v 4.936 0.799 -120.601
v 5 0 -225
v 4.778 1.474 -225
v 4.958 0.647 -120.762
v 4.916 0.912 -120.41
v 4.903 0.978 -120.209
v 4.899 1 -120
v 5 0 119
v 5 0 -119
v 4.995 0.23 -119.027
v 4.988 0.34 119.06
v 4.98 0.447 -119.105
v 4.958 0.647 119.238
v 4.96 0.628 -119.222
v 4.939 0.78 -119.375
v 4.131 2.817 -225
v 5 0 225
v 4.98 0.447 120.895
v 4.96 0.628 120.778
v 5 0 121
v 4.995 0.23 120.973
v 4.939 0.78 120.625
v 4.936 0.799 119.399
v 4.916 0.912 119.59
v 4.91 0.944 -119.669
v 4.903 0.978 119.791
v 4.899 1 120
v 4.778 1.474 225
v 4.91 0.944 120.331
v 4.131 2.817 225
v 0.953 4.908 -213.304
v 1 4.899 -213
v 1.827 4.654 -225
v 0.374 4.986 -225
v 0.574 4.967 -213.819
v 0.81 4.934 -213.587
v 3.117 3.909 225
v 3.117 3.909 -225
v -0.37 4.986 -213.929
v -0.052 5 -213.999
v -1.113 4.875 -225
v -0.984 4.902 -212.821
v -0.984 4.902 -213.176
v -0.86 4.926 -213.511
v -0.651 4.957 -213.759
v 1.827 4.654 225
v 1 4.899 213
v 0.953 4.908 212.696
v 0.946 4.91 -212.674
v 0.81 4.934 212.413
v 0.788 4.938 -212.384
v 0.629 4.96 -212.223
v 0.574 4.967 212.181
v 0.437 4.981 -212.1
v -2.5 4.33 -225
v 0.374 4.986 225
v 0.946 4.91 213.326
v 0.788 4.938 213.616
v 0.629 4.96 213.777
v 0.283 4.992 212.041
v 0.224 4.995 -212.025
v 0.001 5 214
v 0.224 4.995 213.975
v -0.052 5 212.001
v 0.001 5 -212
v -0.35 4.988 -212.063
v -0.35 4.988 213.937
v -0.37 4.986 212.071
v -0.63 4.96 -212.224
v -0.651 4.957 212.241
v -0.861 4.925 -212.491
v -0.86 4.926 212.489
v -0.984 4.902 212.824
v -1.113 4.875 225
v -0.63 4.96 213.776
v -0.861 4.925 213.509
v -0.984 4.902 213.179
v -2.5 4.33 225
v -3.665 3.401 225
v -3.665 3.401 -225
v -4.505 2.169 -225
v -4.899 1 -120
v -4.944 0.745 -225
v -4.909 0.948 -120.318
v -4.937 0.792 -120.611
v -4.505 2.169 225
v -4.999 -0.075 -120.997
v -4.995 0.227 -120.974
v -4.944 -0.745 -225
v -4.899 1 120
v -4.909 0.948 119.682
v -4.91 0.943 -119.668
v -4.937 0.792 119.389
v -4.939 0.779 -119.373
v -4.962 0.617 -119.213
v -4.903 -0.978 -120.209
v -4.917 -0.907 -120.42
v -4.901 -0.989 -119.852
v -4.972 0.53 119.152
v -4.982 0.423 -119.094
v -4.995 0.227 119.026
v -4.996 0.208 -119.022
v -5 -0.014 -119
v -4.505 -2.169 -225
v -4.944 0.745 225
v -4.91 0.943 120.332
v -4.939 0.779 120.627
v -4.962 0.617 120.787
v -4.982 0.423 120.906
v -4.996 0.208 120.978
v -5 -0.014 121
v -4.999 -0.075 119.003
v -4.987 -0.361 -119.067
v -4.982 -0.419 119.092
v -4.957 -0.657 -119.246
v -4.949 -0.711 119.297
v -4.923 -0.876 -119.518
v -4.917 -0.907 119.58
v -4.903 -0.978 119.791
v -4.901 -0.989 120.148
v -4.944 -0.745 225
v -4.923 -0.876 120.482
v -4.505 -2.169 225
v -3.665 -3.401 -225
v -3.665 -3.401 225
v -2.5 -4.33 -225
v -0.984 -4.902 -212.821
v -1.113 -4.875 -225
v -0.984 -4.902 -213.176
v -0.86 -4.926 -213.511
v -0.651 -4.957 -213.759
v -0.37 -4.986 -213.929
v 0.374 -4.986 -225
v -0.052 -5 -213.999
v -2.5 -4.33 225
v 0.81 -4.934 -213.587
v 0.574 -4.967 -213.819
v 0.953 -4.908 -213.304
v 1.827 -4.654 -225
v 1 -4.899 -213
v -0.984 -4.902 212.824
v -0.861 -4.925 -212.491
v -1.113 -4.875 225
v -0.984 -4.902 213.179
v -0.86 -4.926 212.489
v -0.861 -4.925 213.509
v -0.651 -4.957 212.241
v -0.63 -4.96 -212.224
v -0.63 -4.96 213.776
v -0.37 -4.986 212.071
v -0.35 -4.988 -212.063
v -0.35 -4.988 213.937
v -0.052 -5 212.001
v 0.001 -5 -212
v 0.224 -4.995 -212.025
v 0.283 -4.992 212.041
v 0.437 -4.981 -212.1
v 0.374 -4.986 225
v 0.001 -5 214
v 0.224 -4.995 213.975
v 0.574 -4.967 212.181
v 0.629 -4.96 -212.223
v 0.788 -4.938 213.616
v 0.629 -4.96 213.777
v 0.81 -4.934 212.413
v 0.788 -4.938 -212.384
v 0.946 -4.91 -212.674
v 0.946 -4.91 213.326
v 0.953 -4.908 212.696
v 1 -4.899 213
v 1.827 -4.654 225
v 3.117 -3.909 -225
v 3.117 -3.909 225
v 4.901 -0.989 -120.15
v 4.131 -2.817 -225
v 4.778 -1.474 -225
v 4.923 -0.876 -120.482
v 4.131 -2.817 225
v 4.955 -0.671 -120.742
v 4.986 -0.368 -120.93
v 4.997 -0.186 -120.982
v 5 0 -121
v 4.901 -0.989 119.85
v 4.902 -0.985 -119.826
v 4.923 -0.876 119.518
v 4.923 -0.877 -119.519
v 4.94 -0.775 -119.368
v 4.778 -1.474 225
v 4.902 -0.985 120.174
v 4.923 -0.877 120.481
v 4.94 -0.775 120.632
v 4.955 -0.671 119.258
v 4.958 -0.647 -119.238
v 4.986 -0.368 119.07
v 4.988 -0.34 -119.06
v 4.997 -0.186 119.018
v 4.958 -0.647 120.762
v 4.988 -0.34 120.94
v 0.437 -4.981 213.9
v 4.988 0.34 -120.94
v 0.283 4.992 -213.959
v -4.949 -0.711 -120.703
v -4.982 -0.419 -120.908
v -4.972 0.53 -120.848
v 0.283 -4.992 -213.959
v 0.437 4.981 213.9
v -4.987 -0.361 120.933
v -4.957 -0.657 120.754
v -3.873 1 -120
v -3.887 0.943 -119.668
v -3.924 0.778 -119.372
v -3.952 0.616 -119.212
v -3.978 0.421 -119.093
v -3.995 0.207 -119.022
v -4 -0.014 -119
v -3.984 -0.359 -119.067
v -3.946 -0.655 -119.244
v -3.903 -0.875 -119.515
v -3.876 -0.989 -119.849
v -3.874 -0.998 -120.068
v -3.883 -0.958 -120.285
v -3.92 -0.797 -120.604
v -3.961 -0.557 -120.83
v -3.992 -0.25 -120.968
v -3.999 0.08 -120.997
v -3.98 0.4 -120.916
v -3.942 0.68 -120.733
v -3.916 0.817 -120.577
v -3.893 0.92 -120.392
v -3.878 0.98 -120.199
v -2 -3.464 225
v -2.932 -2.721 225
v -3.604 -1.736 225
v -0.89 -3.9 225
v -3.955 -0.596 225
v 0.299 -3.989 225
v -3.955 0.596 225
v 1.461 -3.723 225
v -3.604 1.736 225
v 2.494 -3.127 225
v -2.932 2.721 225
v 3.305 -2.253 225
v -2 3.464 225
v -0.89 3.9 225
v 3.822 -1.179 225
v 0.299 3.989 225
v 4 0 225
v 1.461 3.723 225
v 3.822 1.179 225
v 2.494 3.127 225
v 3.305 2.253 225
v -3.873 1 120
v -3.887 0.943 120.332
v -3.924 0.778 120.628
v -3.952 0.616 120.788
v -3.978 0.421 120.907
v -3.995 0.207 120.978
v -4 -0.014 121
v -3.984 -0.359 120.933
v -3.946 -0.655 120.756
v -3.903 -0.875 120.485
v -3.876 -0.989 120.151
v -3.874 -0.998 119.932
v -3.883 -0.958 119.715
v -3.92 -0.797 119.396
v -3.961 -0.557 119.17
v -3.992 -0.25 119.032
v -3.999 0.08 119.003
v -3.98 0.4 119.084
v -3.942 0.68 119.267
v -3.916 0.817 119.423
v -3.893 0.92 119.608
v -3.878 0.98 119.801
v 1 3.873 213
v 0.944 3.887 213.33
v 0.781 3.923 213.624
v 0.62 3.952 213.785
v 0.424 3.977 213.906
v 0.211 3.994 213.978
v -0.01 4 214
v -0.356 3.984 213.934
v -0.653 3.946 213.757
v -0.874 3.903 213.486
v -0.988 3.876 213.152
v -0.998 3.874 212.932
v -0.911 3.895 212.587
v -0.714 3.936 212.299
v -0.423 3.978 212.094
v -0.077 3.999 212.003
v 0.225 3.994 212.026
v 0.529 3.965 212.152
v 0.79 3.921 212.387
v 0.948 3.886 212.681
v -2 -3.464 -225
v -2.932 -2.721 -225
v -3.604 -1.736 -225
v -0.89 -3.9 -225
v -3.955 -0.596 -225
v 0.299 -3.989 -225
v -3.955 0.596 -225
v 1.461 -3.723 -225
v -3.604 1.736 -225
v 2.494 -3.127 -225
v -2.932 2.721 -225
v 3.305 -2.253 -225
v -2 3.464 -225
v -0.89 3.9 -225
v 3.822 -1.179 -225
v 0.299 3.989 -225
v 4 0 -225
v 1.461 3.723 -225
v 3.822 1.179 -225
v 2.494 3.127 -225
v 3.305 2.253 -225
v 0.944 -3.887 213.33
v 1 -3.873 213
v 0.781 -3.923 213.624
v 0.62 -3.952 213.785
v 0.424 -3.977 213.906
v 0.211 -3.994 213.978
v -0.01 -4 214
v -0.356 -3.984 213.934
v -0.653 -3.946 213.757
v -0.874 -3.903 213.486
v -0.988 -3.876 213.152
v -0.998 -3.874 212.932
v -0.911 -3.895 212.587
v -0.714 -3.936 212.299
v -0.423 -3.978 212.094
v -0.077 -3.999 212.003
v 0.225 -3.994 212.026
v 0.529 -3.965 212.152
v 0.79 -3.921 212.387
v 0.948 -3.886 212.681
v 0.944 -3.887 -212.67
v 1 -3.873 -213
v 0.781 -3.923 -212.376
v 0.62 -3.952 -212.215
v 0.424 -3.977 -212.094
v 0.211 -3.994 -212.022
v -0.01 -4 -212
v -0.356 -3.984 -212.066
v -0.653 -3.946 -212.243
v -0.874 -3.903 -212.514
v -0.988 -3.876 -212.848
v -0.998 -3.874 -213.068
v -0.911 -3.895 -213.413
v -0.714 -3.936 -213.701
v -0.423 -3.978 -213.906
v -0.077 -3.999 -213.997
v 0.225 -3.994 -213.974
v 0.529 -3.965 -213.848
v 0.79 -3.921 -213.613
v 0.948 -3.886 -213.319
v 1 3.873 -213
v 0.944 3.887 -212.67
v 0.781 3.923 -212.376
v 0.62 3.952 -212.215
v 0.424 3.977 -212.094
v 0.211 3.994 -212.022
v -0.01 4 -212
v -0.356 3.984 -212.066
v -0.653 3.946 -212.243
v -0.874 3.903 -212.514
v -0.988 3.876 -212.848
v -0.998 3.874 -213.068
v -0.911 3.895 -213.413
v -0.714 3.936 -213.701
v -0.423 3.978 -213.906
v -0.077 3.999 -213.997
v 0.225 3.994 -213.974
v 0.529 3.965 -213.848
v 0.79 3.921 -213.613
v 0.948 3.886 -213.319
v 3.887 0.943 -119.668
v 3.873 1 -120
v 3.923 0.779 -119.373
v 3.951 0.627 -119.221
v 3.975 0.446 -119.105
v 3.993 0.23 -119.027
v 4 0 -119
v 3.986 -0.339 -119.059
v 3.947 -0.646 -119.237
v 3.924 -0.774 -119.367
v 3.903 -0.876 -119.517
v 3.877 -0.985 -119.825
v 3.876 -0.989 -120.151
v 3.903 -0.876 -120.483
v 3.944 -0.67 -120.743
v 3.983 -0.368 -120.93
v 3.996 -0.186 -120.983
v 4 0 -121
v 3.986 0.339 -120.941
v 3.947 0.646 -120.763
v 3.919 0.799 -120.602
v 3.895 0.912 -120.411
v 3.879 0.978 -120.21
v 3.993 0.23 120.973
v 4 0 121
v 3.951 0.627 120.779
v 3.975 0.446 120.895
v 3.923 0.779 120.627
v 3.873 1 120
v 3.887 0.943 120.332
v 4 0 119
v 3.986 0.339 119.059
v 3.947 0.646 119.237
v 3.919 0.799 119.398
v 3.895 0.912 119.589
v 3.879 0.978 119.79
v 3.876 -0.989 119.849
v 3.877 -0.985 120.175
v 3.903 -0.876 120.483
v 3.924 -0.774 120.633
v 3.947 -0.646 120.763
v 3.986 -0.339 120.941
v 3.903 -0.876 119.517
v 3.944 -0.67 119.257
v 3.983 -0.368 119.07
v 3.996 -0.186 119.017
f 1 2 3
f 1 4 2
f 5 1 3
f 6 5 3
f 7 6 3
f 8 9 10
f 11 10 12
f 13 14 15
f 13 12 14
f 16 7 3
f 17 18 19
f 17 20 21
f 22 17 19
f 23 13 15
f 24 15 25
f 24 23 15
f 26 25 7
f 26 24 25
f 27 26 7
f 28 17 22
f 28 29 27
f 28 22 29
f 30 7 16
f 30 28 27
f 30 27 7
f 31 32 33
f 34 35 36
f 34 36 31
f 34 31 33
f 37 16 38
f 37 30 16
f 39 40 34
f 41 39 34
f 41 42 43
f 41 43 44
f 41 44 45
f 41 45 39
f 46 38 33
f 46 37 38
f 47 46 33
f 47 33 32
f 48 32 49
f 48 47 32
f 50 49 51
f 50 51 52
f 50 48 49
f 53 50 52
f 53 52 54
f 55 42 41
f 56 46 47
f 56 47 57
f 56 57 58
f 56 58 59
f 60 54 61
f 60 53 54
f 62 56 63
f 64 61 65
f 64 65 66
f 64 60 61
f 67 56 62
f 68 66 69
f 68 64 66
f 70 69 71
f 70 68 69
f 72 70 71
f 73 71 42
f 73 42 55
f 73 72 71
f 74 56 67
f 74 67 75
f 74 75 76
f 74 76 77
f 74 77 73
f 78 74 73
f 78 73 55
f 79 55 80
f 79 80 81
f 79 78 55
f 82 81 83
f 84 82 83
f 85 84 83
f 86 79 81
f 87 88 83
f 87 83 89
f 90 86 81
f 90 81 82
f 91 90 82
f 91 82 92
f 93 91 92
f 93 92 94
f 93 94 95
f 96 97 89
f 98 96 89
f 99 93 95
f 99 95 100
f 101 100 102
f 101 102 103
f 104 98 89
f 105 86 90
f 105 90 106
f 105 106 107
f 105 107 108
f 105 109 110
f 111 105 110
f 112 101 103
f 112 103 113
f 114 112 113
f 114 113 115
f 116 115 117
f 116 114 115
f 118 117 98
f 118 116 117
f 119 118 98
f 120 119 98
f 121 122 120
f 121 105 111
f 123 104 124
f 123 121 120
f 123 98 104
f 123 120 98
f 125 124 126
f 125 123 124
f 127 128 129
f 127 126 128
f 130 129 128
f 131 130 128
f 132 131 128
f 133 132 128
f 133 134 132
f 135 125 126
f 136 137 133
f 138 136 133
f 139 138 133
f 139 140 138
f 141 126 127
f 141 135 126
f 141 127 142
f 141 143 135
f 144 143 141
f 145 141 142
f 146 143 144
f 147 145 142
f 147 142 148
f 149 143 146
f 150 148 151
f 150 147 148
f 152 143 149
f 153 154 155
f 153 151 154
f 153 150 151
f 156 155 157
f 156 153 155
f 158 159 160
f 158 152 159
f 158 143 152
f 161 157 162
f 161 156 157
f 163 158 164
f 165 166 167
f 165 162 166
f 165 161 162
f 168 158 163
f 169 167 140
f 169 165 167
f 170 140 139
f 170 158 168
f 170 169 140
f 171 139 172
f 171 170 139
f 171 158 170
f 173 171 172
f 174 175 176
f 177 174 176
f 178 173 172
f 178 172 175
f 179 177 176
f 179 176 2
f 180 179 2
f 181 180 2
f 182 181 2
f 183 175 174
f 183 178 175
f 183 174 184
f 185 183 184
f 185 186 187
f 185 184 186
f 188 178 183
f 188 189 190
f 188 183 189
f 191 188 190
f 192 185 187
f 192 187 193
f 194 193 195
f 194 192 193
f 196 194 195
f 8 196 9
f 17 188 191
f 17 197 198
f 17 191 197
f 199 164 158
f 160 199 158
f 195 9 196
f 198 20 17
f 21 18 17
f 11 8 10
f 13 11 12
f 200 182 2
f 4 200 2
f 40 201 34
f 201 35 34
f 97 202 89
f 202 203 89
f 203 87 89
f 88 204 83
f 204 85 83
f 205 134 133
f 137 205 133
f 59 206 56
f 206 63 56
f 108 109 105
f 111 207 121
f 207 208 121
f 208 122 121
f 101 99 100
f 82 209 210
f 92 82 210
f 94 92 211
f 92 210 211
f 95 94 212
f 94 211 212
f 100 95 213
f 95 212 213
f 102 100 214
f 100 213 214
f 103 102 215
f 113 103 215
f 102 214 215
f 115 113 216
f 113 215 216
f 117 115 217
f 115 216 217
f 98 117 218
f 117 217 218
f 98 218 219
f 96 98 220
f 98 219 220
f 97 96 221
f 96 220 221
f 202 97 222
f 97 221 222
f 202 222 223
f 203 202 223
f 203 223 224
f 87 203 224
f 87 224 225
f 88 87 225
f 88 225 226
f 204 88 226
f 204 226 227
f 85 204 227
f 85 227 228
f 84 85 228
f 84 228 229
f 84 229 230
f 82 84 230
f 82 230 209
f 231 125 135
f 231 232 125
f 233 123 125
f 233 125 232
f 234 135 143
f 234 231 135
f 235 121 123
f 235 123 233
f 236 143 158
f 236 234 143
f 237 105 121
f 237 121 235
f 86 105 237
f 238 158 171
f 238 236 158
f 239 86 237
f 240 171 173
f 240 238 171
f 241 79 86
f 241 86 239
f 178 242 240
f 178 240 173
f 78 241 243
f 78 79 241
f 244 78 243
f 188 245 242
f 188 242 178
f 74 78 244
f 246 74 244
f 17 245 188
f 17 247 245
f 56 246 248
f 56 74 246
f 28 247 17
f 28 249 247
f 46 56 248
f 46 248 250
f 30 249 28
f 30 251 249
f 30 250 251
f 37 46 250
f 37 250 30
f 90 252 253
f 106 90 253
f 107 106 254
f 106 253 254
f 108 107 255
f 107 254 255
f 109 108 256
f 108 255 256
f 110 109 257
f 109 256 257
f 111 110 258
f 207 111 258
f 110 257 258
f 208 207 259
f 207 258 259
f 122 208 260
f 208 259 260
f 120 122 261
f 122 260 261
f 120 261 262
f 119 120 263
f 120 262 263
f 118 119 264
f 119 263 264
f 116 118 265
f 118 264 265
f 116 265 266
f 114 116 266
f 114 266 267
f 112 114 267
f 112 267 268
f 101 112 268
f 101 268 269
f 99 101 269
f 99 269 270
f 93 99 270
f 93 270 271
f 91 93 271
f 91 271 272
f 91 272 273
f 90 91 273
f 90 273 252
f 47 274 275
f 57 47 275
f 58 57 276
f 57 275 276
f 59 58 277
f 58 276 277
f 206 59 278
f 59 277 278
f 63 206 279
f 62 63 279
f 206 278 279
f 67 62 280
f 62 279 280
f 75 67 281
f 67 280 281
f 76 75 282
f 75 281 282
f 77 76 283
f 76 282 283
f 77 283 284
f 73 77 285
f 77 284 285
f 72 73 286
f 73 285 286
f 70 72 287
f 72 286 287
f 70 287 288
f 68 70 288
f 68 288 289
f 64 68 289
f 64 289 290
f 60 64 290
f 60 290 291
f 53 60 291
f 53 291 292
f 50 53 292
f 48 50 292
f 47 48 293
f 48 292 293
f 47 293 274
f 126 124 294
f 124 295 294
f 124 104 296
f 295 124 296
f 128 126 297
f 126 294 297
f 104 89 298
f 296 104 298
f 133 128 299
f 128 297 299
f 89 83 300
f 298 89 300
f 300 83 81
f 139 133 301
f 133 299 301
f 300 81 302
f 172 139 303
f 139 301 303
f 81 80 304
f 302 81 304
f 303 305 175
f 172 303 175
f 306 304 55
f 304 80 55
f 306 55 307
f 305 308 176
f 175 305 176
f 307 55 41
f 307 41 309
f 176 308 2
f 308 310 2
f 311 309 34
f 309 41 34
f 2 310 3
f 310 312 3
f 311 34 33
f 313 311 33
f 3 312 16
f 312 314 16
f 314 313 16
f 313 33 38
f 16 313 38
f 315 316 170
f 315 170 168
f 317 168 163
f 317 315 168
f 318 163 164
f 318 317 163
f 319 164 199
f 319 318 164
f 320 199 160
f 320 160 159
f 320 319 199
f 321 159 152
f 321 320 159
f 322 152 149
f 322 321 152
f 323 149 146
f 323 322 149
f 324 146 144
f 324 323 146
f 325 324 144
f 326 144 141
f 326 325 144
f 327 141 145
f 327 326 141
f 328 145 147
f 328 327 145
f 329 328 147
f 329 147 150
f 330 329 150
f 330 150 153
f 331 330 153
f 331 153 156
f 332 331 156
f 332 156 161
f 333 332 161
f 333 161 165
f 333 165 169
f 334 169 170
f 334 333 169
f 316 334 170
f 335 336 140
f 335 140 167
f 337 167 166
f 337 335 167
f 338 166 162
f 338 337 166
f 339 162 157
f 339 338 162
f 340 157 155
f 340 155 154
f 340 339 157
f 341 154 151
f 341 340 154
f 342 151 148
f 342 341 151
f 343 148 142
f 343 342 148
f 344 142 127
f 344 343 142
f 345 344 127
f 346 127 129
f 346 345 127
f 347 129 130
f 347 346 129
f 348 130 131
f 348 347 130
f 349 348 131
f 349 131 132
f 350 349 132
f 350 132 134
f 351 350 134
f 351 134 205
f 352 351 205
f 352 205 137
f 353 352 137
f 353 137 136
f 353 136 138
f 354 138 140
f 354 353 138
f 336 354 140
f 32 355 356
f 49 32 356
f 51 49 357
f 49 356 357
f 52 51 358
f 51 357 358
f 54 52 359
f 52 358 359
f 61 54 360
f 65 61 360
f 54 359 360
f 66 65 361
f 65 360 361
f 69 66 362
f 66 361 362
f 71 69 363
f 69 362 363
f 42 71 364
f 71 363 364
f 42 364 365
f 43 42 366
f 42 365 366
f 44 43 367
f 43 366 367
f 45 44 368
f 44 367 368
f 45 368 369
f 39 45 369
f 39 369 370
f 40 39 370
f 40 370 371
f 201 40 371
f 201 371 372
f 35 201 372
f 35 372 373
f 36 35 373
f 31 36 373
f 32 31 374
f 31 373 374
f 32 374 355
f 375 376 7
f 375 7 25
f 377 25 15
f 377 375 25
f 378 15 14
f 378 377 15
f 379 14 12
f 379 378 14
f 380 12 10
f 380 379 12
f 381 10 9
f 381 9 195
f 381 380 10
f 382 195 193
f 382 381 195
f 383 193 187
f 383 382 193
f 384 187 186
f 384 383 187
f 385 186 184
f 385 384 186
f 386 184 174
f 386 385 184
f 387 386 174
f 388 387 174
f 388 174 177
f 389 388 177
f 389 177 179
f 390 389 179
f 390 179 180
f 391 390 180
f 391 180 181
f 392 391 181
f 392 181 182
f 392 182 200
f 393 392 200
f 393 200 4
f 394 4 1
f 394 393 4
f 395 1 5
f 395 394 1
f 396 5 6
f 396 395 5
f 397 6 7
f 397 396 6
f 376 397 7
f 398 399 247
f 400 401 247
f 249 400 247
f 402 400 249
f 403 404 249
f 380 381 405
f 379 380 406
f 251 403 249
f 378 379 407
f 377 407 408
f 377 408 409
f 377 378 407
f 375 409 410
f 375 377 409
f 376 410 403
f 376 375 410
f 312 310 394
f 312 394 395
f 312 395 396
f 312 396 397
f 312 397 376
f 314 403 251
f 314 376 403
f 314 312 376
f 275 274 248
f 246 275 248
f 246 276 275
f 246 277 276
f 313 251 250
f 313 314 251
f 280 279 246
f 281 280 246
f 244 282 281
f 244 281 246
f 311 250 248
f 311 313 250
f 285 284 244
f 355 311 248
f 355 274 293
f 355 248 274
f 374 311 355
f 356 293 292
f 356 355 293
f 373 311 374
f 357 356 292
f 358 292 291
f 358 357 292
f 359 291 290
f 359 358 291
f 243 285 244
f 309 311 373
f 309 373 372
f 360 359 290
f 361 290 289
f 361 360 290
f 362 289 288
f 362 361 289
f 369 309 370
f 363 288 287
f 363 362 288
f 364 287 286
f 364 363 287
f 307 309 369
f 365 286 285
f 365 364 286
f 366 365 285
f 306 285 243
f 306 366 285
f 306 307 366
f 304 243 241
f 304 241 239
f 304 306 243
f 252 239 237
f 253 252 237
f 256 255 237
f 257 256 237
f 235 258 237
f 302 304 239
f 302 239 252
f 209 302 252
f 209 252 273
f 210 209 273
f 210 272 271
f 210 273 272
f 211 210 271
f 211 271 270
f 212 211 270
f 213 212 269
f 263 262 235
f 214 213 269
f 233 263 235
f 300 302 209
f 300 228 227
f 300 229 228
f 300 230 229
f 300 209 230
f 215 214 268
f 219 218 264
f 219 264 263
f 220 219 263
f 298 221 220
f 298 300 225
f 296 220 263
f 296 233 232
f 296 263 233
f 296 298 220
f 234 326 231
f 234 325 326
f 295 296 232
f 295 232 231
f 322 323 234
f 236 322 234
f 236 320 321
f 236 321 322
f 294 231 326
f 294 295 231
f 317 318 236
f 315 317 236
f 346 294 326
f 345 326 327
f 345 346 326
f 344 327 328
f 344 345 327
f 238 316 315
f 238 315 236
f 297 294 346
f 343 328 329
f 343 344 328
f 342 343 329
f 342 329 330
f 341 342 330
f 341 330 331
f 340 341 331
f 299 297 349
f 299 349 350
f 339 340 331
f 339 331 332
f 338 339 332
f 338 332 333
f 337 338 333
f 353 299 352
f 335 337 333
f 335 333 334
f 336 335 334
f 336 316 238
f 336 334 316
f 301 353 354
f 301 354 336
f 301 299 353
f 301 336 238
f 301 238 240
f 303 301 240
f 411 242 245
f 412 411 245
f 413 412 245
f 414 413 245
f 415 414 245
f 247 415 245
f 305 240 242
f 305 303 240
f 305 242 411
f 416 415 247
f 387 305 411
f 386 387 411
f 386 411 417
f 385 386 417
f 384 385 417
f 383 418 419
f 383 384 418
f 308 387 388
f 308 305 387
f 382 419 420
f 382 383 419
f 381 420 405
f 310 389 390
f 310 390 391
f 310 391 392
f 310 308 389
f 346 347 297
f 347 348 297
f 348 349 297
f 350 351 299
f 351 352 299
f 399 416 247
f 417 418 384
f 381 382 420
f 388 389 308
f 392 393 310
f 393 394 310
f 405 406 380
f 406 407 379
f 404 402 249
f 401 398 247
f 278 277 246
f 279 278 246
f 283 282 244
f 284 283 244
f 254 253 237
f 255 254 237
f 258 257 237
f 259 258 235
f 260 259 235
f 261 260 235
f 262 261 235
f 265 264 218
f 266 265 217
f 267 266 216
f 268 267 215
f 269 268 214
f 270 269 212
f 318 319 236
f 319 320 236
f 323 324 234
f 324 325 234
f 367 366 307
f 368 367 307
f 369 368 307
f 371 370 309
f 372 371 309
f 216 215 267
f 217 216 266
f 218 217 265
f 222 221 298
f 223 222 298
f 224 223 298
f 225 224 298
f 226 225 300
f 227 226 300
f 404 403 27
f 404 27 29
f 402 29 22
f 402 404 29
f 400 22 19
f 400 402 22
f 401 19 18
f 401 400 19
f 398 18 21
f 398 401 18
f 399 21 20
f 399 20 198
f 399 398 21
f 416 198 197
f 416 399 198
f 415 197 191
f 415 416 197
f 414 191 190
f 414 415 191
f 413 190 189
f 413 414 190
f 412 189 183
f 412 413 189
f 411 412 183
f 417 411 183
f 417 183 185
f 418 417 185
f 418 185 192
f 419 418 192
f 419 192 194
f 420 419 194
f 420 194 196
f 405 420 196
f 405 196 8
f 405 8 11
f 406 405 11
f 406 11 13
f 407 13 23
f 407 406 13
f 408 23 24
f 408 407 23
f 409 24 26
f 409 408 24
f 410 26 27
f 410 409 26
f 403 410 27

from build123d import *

# Parameters (mm, degrees)
F0_R          = 5
F0_R_2        = 4
F1_DEPTH      = 225
F2_R          = 1
F3_DEPTH      = 5.001
F3_DEPTH_BACK = 5.001
F4_R          = 1
F5_DEPTH      = 5.0010001
F5_DEPTH_BACK = 5.0010001


with BuildPart() as f1:
    # F0 (on Top) → F1 (new body, symmetric)
    with BuildSketch(Plane.XY):
        Circle(F0_R)
        Circle(F0_R_2, mode=Mode.SUBTRACT)
    extrude(amount=F1_DEPTH, both=True)

    # F2 (on Front) → F3 (cut, two sides)
    with BuildSketch(Plane.XZ) as f3_sk:
        with Locations((0, 213)):
            Circle(F2_R)
        with Locations((0, -213)):
            Circle(F2_R)
    extrude(amount=-F3_DEPTH, mode=Mode.SUBTRACT)
    extrude(f3_sk.sketch, amount=F3_DEPTH_BACK, mode=Mode.SUBTRACT)

    # F4 (on Right) → F5 (cut, two sides)
    with BuildSketch(Plane.YZ) as f5_sk:
        with Locations((0, 120)):
            Circle(F4_R)
        with Locations((0, -120)):
            Circle(F4_R)
    extrude(amount=-F5_DEPTH, mode=Mode.SUBTRACT)
    extrude(f5_sk.sketch, amount=F5_DEPTH_BACK, mode=Mode.SUBTRACT)


solid = f1.part
